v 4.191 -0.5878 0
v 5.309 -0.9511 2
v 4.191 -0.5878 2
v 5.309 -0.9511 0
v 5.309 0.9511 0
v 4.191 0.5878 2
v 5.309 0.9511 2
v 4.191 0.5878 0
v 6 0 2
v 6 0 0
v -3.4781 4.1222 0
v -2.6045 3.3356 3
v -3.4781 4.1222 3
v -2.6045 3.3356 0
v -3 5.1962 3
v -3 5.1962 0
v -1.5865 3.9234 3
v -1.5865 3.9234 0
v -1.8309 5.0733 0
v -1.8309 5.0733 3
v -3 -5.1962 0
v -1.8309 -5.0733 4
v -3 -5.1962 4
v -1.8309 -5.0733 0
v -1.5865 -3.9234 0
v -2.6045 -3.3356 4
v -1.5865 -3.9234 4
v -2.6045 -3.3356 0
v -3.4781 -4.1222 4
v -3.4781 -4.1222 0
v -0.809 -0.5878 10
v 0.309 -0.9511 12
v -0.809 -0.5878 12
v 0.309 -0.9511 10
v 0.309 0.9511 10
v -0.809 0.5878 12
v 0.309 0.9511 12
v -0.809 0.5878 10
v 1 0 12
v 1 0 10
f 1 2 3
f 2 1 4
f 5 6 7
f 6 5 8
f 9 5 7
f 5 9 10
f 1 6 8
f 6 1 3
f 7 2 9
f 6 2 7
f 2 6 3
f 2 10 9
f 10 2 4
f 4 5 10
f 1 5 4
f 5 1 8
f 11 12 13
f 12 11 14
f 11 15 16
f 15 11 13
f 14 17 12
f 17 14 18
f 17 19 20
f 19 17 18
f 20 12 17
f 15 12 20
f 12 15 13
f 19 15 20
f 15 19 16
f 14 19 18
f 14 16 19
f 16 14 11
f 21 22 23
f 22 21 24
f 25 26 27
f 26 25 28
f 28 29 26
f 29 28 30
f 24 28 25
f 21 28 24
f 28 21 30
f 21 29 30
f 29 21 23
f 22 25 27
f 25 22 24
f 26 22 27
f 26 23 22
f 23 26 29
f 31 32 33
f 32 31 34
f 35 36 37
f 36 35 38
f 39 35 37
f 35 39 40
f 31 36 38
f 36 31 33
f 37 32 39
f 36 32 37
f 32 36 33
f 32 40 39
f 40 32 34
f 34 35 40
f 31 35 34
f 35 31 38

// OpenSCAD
// file: libs/nested/inner.scad
// Included by libs/defs.scad; the path is relative to the including file's folder.

inner_note = "from inner";
echo("inner included");
// file: libs/shapes.scad
// Used by eval-include-main.scad: only the definitions are imported. The echo and the geometry below are
// never run, and lib_value is reachable only through the library's own functions.

echo("shapes top level is not run by use");
cube(99);

lib_value = 42;
function lib_value_plus(k) = lib_value + k;
function peg_count(n) = n * 2;

module peg(h) {
    cylinder(h = h, r = 1);
}

module peg_ring(n) {
    for (i = [0 : n - 1])
        rotate([0, 0, i * 360 / n])
            translate([5, 0, 0])
                peg(h = 2 + i);
}
// file: libs/defs.scad
// Included by eval-include-main.scad: its statements run in the including file, in place.

unit = 5;
scale_factor = unit * 2;
include <nested/inner.scad>
echo("defs included", unit);
// main file
// Evaluation fixture: include and use. Run through the file system and through an in-memory resolver.

include <libs/defs.scad>
use <libs/shapes.scad>

echo("main", unit, scale_factor, inner_note);
echo("library function", peg_count(3), lib_value_plus(8));
echo("library value is private", is_undef(lib_value));

peg_ring(3);
translate([0, 0, scale_factor]) peg(h = 2);
